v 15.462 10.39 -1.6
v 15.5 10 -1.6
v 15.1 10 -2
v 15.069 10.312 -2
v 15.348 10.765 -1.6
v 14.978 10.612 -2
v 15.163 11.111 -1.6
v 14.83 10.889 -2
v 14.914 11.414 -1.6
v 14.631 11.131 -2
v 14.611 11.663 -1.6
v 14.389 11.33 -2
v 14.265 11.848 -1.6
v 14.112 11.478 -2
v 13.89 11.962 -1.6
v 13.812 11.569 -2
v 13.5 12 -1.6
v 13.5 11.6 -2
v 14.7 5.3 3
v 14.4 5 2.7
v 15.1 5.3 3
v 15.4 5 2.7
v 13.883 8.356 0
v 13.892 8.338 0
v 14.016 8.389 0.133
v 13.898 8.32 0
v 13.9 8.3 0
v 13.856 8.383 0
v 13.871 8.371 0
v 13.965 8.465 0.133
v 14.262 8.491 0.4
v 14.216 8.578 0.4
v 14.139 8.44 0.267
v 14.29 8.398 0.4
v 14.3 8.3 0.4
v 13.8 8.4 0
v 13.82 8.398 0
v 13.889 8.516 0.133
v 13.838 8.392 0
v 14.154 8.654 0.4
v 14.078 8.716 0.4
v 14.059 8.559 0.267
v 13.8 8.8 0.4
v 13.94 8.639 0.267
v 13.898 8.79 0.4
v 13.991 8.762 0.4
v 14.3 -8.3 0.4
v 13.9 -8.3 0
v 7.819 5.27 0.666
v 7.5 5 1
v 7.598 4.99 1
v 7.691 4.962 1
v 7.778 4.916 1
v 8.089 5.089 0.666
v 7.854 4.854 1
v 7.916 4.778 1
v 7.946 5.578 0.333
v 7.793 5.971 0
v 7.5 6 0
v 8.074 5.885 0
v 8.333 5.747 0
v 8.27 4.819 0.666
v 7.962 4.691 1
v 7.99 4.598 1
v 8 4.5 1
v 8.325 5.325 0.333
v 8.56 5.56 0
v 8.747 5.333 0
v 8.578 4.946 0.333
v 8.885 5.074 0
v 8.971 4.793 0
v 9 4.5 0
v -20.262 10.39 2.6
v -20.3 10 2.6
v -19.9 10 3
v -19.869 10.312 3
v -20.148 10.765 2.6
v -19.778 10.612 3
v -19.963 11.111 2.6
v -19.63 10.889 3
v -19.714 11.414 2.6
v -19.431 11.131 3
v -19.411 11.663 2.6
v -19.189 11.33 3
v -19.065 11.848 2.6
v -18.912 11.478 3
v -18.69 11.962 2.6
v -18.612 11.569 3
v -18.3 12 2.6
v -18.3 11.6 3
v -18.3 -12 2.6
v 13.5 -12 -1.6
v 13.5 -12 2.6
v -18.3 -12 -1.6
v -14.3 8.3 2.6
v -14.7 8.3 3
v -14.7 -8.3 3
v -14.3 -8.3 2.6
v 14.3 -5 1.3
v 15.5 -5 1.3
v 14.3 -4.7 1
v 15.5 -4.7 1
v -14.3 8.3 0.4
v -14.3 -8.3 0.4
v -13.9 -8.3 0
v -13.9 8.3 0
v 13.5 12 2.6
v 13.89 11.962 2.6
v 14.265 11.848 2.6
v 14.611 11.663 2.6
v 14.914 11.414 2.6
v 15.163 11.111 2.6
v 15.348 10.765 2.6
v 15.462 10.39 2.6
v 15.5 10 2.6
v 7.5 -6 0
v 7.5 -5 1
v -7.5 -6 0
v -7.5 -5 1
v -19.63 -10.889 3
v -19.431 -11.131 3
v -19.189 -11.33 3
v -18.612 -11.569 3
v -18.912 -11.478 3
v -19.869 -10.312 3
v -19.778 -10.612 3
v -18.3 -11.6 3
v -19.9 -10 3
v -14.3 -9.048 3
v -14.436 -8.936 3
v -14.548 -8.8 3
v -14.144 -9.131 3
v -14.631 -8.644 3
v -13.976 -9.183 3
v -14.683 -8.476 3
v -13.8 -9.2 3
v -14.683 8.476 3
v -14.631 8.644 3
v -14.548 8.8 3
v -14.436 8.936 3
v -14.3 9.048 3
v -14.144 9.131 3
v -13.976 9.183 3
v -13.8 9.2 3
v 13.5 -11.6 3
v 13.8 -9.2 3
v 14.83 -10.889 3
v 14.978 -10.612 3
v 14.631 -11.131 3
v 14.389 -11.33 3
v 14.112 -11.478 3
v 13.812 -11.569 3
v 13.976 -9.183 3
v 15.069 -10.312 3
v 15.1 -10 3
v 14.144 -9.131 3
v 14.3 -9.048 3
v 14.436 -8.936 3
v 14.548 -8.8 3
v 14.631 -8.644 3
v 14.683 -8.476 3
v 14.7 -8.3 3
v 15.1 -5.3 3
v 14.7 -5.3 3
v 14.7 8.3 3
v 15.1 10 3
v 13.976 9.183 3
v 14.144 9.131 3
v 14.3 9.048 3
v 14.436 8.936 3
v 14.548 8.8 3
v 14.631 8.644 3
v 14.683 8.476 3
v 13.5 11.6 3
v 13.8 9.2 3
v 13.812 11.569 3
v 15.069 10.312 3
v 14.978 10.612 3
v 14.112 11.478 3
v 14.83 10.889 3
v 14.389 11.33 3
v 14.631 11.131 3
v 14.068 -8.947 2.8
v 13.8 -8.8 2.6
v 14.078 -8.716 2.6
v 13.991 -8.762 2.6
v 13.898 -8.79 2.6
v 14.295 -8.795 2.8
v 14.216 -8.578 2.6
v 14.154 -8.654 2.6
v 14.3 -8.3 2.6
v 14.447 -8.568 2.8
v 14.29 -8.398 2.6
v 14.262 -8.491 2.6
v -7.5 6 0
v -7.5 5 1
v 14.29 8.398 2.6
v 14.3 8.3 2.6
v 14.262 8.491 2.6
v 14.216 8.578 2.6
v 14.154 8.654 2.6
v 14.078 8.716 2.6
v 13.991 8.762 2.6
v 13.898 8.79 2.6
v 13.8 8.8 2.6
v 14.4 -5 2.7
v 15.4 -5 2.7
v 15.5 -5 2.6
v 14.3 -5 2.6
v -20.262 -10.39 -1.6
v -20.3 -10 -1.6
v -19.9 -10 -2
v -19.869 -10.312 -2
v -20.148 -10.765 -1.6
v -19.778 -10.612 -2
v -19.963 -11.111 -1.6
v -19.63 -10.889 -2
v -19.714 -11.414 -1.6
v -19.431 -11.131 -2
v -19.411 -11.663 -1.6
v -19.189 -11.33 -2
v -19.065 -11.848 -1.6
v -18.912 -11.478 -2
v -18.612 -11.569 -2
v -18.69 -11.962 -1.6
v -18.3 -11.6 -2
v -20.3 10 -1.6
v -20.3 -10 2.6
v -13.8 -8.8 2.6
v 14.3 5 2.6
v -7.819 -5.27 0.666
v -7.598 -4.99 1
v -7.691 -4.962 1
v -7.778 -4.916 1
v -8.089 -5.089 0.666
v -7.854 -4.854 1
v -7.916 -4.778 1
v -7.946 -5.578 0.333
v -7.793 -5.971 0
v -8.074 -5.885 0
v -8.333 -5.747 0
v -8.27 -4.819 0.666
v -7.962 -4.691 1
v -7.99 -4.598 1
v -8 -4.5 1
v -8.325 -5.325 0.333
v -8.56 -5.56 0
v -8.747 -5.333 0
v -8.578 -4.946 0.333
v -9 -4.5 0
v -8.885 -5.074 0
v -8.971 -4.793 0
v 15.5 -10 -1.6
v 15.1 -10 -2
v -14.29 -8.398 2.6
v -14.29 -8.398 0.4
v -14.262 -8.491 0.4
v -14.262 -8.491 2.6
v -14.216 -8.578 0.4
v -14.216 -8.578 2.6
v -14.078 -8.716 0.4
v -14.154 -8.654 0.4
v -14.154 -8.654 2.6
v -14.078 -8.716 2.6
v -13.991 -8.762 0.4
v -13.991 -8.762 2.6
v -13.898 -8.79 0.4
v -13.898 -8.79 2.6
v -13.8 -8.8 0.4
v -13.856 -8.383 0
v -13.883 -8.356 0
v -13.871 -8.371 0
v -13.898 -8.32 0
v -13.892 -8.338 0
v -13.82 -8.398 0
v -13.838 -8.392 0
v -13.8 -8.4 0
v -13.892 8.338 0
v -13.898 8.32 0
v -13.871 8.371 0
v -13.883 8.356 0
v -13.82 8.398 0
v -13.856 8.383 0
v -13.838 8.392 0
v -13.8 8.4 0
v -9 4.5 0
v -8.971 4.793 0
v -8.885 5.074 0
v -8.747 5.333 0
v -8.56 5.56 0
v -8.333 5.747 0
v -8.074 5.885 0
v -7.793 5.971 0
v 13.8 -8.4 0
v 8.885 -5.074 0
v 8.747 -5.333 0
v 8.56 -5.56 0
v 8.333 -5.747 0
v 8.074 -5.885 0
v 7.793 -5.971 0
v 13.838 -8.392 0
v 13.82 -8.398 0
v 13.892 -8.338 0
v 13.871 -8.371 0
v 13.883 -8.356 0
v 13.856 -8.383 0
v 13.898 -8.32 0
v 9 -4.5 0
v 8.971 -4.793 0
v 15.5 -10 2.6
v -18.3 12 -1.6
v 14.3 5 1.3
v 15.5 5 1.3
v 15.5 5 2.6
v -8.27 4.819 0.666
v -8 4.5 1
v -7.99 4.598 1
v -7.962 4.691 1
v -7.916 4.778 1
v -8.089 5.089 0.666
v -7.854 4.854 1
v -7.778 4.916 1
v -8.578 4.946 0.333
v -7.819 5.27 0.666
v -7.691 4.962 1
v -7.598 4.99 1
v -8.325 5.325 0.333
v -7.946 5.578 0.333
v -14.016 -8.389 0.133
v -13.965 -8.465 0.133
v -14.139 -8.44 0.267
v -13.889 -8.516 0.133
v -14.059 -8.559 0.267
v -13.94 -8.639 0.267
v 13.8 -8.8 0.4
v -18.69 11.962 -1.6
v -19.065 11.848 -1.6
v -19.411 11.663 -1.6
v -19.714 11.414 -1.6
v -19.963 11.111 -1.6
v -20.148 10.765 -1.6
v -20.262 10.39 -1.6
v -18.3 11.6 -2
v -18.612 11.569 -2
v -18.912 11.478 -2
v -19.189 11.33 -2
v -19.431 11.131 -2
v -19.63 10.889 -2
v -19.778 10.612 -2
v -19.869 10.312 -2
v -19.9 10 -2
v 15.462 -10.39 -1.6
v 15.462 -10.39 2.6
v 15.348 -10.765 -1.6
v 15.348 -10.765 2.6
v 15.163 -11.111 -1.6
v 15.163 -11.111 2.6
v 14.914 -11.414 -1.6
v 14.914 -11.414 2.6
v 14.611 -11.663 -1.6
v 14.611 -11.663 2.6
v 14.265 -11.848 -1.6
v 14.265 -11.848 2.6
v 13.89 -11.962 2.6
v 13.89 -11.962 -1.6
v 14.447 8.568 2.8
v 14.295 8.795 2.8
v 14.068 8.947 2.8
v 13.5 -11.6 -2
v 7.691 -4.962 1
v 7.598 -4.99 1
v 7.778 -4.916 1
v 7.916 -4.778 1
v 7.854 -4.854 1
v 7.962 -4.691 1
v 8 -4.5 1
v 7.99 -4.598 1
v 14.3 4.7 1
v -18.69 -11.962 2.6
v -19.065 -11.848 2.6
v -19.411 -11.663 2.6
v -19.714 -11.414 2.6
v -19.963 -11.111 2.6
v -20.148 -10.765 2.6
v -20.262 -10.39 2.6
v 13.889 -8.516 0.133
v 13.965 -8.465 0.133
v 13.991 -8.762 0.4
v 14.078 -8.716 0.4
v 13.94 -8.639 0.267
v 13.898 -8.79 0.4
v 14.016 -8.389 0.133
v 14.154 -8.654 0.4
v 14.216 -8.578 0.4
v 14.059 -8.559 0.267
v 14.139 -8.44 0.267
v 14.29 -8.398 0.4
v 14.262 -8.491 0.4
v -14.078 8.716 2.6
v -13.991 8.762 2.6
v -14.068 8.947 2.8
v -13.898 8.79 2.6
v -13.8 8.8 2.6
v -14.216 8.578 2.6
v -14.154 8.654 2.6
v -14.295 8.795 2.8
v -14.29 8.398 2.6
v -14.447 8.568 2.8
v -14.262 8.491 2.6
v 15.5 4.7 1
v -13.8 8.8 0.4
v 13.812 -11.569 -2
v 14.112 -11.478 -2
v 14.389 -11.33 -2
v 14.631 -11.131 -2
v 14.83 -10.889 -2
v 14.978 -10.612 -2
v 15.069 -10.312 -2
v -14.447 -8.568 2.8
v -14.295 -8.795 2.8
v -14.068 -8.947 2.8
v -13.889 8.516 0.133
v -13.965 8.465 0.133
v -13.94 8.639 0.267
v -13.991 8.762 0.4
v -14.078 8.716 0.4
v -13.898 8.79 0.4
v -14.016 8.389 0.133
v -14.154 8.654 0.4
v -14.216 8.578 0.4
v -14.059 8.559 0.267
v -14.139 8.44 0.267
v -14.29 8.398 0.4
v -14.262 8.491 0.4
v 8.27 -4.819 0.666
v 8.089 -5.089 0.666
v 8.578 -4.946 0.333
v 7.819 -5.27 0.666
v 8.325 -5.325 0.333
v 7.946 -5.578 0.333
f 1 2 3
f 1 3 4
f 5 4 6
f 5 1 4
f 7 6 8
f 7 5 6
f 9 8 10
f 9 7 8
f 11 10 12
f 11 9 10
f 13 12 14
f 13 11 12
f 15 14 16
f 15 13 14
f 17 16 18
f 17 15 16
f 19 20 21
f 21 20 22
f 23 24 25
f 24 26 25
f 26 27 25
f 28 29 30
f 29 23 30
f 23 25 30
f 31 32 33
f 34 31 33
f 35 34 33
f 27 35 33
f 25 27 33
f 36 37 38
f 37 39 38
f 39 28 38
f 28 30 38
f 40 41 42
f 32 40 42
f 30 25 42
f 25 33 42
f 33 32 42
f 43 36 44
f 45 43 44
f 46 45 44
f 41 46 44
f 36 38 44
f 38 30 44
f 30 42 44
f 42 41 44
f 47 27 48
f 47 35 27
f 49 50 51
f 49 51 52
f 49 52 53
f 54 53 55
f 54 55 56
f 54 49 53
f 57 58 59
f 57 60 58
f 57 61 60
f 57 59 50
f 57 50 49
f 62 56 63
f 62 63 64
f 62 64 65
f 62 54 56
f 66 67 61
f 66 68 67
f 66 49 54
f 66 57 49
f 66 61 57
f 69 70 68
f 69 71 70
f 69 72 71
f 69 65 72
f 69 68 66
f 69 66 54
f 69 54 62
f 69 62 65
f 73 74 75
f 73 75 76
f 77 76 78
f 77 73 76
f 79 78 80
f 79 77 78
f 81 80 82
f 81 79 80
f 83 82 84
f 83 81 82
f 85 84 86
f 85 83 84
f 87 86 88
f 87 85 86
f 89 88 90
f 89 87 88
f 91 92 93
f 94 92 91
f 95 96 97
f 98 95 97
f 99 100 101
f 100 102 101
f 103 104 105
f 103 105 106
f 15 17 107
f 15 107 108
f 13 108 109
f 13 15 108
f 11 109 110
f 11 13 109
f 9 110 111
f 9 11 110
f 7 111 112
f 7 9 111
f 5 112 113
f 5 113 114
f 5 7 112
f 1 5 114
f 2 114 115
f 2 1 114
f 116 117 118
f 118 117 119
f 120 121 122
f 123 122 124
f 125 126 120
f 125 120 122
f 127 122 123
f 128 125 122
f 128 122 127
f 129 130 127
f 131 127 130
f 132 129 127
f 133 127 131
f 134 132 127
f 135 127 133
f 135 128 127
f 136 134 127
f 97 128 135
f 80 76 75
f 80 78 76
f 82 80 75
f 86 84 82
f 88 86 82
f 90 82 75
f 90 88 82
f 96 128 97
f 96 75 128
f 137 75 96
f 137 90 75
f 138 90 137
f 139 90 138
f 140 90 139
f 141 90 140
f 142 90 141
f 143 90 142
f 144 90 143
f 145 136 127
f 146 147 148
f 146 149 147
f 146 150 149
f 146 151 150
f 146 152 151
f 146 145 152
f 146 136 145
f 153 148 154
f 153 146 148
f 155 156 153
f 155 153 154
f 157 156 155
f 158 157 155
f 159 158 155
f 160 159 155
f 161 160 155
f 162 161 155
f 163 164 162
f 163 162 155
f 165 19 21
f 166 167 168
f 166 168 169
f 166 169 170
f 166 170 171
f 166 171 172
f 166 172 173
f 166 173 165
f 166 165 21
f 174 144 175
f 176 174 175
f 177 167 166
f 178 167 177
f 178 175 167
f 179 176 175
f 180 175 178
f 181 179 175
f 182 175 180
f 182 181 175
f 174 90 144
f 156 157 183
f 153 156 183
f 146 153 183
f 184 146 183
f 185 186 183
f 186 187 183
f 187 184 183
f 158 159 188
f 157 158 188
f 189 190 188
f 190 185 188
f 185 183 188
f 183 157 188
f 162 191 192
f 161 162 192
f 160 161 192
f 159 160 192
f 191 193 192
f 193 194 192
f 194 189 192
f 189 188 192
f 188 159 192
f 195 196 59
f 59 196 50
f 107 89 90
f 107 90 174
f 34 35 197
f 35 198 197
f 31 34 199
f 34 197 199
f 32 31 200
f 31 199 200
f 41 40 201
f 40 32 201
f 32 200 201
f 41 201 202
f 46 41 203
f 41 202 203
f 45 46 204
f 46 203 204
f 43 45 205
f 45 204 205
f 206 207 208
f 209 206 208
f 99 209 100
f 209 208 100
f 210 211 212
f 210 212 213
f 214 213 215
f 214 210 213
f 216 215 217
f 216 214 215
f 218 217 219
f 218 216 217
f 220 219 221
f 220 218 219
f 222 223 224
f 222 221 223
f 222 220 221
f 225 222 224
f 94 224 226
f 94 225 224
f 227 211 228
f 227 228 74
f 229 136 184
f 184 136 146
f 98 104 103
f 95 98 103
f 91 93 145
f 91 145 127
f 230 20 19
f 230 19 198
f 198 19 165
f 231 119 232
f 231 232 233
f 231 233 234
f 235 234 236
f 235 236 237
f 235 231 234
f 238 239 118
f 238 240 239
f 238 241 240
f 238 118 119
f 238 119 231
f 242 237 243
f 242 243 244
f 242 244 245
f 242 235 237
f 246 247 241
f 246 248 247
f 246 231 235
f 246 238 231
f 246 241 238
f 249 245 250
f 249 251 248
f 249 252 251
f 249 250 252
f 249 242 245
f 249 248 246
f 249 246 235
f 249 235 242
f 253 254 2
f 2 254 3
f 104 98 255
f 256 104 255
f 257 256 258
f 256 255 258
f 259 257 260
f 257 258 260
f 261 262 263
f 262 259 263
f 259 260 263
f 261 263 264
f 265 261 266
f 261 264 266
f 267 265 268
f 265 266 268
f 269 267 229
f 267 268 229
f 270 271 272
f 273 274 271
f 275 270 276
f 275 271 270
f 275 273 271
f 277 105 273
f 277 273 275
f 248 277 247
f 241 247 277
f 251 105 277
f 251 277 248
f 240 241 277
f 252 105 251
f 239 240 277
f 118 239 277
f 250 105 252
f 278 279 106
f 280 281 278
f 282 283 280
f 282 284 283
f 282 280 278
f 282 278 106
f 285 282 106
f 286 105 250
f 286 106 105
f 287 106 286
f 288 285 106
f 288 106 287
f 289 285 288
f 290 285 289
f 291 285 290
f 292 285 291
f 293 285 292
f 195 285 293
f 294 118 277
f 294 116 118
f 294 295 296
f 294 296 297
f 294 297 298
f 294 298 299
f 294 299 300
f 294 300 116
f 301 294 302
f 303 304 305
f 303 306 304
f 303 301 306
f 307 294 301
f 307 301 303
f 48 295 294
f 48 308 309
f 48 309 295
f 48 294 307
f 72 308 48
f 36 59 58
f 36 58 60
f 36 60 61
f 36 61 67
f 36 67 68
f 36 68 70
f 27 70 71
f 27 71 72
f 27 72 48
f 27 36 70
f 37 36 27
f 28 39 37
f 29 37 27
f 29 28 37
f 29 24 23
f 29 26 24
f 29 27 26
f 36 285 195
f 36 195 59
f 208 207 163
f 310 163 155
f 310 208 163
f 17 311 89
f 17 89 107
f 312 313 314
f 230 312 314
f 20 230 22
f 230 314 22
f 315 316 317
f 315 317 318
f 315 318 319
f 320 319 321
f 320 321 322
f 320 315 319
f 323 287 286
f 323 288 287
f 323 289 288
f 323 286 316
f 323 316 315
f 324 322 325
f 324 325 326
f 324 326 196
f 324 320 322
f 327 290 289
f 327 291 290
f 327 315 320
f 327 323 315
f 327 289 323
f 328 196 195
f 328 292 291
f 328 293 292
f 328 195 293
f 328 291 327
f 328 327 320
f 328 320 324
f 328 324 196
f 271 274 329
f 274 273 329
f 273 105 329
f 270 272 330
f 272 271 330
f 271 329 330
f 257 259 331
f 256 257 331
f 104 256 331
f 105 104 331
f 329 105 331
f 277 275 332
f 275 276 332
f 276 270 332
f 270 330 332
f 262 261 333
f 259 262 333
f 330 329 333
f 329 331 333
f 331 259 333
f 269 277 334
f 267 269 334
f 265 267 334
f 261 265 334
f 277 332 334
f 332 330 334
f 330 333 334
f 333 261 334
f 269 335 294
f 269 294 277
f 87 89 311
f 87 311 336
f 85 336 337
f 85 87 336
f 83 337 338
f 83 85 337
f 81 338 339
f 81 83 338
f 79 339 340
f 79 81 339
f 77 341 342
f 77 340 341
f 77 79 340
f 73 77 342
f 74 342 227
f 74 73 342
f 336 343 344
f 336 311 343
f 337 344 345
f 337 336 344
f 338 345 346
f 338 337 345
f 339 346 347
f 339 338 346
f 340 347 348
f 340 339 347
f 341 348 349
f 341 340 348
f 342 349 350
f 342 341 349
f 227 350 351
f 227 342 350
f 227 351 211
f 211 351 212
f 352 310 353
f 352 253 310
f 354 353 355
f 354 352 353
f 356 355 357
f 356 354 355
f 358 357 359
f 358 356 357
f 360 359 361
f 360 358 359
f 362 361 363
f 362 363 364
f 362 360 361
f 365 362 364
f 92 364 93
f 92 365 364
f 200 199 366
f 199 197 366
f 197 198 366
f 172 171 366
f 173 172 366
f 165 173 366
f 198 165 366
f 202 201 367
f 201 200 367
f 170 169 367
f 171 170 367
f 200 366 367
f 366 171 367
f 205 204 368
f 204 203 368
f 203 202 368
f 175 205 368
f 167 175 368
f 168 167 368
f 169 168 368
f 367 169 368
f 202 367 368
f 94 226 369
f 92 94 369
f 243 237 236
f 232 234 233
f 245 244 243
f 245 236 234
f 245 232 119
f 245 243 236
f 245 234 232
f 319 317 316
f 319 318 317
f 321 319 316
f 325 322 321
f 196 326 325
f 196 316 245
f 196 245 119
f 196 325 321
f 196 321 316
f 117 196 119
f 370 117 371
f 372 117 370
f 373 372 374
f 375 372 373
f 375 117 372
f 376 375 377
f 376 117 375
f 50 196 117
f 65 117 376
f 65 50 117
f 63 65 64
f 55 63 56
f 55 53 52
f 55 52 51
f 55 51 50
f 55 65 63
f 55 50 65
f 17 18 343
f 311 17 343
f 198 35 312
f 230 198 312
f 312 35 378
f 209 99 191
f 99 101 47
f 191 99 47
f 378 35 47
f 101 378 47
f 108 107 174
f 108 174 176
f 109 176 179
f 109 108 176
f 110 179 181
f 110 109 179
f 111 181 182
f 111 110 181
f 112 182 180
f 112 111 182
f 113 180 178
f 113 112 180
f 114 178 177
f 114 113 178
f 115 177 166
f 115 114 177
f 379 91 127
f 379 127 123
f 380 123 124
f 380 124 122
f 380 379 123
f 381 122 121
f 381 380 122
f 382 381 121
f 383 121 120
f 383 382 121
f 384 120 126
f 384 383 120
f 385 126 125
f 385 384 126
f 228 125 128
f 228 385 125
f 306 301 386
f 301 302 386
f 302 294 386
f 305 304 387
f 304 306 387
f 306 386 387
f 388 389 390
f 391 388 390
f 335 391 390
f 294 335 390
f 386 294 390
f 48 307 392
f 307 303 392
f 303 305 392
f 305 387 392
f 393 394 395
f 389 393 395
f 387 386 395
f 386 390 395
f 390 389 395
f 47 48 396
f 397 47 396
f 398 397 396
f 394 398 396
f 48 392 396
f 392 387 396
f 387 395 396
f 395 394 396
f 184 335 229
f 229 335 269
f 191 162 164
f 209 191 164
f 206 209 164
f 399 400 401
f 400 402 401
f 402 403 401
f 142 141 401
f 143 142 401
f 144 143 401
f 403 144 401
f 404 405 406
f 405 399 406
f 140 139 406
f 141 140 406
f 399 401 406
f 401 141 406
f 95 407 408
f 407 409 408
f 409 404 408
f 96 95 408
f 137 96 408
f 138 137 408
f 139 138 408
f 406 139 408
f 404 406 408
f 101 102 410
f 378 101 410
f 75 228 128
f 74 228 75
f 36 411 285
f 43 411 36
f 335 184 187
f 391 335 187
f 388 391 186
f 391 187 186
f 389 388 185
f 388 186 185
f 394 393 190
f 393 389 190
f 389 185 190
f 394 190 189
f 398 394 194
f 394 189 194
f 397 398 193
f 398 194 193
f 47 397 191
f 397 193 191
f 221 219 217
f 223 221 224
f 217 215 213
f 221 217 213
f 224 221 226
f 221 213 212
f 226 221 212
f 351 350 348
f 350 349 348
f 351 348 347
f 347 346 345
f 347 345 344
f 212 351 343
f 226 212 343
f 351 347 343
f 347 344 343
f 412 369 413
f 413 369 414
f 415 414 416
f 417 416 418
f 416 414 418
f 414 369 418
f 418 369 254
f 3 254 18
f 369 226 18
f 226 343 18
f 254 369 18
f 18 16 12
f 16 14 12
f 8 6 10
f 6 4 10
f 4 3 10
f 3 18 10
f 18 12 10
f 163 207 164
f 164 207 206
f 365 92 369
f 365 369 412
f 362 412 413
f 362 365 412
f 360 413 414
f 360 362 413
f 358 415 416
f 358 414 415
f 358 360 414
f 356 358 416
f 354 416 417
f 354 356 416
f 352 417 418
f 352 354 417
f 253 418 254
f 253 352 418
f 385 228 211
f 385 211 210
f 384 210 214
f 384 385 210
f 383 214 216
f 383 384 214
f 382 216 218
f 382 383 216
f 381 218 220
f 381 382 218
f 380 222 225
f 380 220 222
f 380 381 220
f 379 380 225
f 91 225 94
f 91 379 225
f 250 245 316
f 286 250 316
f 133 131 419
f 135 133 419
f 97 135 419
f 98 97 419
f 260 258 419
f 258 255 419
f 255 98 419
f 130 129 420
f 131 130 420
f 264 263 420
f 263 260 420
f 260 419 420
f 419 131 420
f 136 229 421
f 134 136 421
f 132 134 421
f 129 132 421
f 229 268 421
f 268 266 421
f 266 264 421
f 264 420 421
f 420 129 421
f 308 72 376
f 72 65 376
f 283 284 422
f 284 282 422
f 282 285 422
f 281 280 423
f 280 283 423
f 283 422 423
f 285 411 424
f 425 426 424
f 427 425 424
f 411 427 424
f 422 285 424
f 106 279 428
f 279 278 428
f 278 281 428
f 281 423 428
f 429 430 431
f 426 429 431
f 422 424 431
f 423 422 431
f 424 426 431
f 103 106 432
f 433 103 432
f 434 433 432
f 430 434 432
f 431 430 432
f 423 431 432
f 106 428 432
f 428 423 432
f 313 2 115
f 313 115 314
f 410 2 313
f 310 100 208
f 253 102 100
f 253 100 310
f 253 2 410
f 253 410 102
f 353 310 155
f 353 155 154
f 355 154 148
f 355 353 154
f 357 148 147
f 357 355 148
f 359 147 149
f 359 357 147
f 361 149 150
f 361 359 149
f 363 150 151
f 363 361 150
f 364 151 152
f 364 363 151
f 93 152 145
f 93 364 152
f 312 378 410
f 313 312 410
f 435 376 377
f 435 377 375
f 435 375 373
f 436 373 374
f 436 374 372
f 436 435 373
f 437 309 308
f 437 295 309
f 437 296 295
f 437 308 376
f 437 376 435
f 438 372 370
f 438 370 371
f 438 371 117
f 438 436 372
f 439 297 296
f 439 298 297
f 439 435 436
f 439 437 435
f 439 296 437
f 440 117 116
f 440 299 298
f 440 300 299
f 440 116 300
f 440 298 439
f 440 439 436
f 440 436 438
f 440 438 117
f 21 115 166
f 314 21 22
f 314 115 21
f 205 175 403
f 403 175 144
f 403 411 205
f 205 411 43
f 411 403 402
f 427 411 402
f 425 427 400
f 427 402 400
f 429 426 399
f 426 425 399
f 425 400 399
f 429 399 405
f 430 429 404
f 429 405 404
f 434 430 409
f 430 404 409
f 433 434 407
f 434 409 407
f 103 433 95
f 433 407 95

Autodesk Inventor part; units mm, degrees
ref_plane "YZ Plane" through (0, 0, 0) normal (1, 0, 0) x (0, 1, 0)
ref_plane "XZ Plane" through (0, 0, 0) normal (0, 1, 0) x (-1, 0, 0)
ref_plane "XY Plane" through (0, 0, 0) normal (0, 0, 1) x (1, 0, 0)
sketch "Sketch1" plane through (0, 0, 0) normal (0, 0, 1) x (1, 0, 0)
  line L0 (-20.3, 12) -> (15.5, 12)
  line L1 (15.5, 12) -> (15.5, -12)
  line L2 (15.5, -12) -> (-20.3, -12)
  line L3 (-20.3, -12) -> (-20.3, 12)
  line L4 (-14.3, 8.8) -> (14.3, 8.8)
  line L5 (14.3, 8.8) -> (14.3, -8.8)
  line L6 (14.3, -8.8) -> (-14.3, -8.8)
  line L7 (-14.3, -8.8) -> (-14.3, 8.8)
  line L8 (-8, 5) -> (8, 5)
  line L9 (8, 5) -> (8, -5)
  line L10 (8, -5) -> (-8, -5)
  line L11 (-8, -5) -> (-8, 5)
  point P0 (0, 0)
  point P1 (14.3, 0)
  point P2 (0, 8.8)
  point P3 (15.5, 0)
  point P4 (8, 0)
  point P5 (0, 5)
  dimension "d0" = 28.6
  dimension "d1" = 17.6
  dimension "d2" = 1.2
  dimension "d3" = 6
  dimension "d4" = 24
  dimension "d9" = 10
  dimension "d10" = 16
extrude "Extrusion1" add sketch "Sketch1" against normal blind 2 contours L0 L1 L2 L3 | L4 L5 L6 L7 | L8 L9 L10 L11
extrude "Extrusion2" add sketch "Sketch1" along normal blind 3 contours L0 L1 L2 L3
extrude "Extrusion3" add sketch "Sketch1" along normal blind 1 contours L8 L9 L10 L11
fillet "Fillet1" radius 2 4 edges at (-20.3, -12, 0.5) (-20.3, 12, 0.5) (15.5, 12, 0.5) (15.5, -12, 0.5)
fillet "Fillet2" radius 0.5 8 edges at (14.3, 8.8, 1.5) (14.3, -8.8, 1.5) (-14.3, 8.8, 1.5) (-14.3, -8.8, 1.5) (-8, 5, 0.5) (-8, -5, 0.5) (8, -5, 0.5) (8, 5, 0.5)
sketch "Sketch2" plane through (15.5, -10, -2) normal (1, 0, 0) x (0, 0, -1)
  line L0 (-5, 0) -> (-5, 20) projected
  line L1 (-5, 5) -> (-3, 5)
  line L2 (-3, 5) -> (-3, 15)
  line L3 (-3, 15) -> (-5, 15)
  line L4 (-5, 15) -> (-5, 5)
  point P0 (-2, 10)
  point P1 (-3, 10)
  dimension "d21" = 10
  dimension "d22" = 2
extrude "Extrusion4" cut sketch "Sketch2" against normal up to surface (1.2 mm away)
chamfer "Chamfer3" distance 0.3 angle 45 4 edges at (14.9, -5, 1) (14.9, -5, 3) (14.9, 5, 1) (14.9, 5, 3)
chamfer "Chamfer1" distance 1 angle 45 8 edges at (-8, 0, 0) (-7.8536, 4.8536, 0) (0, 5, 0) (7.8536, 4.8536, 0) (8, 0, 0) (7.8536, -4.8536, 0) (0, -5, 0) (-7.8536, -4.8536, 0)
chamfer "Chamfer2" distance 0.4 angle 45 34 edges at (0, 8.8, 0) (-14.1536, 8.6536, 0) (-14.3, 0, 0) (-14.1536, -8.6536, 0) (0, -8.8, 0) (14.1536, -8.6536, 0) (14.3, 0, 0) (14.1536, 8.6536, 0) (0, 8.8, 3) (14.1536, 8.6536, 3) (14.3, -6.8, 3) (14.3, 6.8, 3) (14.1536, -8.6536, 3) (0, -8.8, 3) (-14.1536, -8.6536, 3) (-14.3, 0, 3) (-14.1536, 8.6536, 3) (-2.4, 12, 3) (-19.7142, 11.4142, 3) (-20.3, 0, 3) (-19.7142, -11.4142, 3) (-2.4, -12, 3) (14.9142, -11.4142, 3) (15.5, -7.65, 3) (15.5, 7.65, 3) (14.9142, 11.4142, 3) (-20.3, 0, -2) (-19.7142, 11.4142, -2) (-2.4, 12, -2) (14.9142, 11.4142, -2) (15.5, 0, -2) (14.9142, -11.4142, -2) (-2.4, -12, -2) (-19.7142, -11.4142, -2)
properties part number "tp4056-pad" material "ABS Plastic"
